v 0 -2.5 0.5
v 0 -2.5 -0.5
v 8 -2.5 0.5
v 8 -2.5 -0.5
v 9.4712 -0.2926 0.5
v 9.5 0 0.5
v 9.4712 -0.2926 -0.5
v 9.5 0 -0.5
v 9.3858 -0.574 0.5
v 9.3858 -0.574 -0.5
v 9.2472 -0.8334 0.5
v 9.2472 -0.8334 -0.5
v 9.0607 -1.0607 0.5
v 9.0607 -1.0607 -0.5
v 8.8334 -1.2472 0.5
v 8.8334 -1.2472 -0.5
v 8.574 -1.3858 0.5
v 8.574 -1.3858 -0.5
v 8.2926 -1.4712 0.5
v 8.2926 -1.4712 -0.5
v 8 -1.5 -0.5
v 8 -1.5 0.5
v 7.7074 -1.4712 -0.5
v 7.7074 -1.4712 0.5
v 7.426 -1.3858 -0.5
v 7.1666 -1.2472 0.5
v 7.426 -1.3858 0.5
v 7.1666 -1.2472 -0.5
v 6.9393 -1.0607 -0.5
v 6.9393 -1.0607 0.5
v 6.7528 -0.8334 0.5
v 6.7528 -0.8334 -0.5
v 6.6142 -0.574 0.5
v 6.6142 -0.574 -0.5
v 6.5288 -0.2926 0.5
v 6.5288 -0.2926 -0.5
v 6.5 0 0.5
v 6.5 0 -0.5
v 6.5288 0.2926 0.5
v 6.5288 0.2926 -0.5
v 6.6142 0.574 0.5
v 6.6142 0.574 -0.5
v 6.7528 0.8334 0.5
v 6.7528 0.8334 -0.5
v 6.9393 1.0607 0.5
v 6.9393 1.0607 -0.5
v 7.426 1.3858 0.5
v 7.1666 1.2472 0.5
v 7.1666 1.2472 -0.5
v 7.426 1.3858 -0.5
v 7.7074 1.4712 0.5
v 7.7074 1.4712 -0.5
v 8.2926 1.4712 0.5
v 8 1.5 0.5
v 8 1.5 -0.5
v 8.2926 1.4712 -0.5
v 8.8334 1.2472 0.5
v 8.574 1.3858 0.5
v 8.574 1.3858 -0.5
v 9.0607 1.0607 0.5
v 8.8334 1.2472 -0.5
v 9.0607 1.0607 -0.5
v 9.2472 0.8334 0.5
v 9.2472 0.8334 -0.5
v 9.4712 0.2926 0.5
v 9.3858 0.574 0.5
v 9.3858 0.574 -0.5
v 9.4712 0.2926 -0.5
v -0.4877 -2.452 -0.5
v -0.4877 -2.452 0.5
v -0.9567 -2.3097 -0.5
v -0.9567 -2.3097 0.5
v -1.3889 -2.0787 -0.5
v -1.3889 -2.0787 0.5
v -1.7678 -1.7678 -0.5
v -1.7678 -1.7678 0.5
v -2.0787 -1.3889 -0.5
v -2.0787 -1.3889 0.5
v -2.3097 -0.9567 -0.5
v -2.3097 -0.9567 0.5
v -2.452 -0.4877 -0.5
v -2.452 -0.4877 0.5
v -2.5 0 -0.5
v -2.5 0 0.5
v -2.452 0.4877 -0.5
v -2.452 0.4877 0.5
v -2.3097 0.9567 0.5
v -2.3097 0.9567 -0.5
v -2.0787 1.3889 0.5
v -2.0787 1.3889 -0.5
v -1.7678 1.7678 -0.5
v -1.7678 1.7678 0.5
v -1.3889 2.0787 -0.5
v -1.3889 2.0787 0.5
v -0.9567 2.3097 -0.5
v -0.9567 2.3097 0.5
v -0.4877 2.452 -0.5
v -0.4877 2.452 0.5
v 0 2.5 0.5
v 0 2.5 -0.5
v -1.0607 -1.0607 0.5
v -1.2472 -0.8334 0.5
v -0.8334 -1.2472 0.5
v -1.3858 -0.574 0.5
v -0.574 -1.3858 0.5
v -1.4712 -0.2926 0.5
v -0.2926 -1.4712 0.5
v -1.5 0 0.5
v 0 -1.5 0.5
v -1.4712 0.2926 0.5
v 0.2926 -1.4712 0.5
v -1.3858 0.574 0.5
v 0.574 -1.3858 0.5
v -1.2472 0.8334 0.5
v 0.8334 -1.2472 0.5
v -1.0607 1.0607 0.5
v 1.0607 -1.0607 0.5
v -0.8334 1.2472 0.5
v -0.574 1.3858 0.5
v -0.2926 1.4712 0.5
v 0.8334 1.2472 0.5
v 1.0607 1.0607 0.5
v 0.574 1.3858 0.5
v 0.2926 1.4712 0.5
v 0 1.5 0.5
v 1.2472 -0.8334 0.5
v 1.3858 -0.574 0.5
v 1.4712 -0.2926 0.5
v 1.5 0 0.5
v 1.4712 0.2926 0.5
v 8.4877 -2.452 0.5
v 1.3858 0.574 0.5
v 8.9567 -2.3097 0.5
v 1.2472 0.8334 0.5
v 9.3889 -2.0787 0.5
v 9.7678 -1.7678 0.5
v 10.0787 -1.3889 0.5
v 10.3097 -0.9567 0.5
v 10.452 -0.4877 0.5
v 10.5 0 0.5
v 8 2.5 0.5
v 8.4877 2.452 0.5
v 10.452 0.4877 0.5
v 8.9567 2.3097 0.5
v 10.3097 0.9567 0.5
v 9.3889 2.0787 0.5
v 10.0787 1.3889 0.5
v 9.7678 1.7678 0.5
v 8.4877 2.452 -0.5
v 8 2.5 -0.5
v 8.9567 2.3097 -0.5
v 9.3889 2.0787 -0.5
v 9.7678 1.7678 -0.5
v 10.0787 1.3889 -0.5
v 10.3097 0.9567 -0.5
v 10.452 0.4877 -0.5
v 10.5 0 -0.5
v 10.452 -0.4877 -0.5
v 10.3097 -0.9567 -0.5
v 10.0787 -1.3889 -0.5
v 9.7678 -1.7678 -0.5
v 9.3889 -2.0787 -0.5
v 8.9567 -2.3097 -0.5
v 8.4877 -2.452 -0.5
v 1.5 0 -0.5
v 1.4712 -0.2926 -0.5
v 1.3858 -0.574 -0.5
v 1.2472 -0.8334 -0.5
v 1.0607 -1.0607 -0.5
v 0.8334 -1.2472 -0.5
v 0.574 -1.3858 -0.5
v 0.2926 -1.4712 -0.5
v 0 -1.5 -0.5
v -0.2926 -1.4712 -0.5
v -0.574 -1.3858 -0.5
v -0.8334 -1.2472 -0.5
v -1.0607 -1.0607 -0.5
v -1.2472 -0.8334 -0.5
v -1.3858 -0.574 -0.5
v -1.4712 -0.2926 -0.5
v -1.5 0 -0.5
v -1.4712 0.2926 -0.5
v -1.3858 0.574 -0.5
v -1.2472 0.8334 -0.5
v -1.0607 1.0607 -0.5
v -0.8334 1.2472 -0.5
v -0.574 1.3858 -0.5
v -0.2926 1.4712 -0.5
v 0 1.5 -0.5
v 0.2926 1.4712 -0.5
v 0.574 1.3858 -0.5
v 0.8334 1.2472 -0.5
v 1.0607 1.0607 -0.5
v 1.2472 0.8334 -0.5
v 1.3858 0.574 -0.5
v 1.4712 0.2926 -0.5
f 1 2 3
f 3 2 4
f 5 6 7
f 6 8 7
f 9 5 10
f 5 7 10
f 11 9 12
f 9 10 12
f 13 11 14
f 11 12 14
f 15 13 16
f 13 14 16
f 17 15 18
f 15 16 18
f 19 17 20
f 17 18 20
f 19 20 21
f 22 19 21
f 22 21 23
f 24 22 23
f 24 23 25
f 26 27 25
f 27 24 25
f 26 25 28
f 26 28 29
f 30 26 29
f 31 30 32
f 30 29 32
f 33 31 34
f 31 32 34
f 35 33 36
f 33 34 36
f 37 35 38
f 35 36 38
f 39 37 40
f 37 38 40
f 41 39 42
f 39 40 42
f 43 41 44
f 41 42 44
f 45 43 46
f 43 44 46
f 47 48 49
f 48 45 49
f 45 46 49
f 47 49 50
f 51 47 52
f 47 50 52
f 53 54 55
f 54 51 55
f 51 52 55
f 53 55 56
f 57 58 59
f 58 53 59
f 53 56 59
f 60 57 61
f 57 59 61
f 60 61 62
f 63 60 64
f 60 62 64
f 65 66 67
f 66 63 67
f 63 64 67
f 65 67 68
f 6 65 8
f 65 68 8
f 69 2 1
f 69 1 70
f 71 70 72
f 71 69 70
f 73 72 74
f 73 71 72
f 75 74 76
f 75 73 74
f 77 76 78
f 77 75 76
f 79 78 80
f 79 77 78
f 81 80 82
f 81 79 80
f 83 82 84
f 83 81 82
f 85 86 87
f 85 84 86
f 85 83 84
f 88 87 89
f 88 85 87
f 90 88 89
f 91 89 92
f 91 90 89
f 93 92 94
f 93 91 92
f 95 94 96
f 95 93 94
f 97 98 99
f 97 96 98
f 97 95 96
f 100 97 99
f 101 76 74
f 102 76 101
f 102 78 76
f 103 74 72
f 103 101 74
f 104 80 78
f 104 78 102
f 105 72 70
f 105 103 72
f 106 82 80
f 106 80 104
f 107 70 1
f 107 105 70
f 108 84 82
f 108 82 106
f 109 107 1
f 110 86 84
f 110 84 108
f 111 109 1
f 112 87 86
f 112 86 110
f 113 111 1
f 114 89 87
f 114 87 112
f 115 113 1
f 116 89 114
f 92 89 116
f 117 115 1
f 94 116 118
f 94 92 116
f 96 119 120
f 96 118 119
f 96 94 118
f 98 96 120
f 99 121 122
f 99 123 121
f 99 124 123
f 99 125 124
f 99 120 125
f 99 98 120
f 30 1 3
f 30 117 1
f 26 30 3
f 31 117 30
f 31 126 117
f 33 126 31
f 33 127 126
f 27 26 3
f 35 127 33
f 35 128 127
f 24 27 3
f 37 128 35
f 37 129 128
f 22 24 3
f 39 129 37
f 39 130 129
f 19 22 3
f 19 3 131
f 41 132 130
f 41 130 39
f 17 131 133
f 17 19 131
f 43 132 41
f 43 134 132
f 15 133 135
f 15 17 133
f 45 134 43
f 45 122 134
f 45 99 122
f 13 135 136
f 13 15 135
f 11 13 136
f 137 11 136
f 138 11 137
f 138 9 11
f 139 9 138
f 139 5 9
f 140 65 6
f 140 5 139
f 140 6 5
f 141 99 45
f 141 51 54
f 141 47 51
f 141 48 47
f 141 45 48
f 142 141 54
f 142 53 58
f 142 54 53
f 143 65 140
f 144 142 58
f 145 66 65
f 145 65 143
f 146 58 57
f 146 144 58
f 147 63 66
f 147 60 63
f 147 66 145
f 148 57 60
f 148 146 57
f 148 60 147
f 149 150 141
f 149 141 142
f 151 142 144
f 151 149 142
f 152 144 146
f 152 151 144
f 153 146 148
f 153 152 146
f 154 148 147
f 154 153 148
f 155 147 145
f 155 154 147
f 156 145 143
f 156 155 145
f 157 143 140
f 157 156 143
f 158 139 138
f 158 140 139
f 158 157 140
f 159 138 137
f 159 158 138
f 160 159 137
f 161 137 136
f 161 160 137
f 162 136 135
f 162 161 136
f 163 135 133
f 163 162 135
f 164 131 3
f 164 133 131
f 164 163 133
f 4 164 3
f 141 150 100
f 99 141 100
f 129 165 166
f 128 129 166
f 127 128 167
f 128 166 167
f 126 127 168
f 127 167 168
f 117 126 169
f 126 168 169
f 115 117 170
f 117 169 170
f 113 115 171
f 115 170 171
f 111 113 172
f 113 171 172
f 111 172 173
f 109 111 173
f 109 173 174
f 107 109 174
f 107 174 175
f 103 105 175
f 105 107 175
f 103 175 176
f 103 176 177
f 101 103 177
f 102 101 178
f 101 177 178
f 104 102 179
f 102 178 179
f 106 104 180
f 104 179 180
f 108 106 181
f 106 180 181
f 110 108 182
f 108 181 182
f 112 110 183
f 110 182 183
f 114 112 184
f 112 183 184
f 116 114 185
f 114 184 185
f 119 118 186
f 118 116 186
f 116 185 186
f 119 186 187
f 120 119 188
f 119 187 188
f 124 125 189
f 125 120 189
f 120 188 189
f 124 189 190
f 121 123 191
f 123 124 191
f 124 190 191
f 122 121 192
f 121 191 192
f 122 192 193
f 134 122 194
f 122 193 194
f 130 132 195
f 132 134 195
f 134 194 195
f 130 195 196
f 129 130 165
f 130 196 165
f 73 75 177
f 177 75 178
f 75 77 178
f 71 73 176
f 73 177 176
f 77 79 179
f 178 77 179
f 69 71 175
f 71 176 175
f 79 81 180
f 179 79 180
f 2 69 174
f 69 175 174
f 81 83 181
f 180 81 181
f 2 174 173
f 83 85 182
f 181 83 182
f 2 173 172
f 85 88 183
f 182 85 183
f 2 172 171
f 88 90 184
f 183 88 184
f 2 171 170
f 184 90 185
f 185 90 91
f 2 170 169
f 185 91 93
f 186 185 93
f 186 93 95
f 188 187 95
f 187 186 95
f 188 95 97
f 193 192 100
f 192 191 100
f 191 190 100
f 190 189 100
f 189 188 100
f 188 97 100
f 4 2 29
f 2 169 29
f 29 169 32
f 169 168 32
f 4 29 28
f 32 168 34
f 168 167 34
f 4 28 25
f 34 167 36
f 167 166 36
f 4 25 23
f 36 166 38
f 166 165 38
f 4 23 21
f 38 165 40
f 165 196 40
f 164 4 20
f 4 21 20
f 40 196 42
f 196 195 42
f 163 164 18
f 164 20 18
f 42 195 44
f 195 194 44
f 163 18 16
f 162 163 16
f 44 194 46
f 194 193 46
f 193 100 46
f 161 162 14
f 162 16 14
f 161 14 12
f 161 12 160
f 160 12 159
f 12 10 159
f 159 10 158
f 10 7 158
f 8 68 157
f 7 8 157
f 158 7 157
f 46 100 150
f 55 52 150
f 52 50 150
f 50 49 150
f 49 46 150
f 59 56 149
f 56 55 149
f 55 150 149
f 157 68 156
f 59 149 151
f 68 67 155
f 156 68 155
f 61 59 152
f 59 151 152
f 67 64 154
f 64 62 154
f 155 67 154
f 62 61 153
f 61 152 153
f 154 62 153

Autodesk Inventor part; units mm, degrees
ref_plane "YZ Plane" through (0, 0, 0) normal (1, 0, 0) x (0, 1, 0)
ref_plane "XZ Plane" through (0, 0, 0) normal (0, 1, 0) x (-1, 0, 0)
ref_plane "XY Plane" through (0, 0, 0) normal (0, 0, 1) x (1, 0, 0)
sketch "Sketch1" plane through (0, 0, 0) normal (0, 0, 1) x (1, 0, 0)
  line L0 (0, 0) -> (8, 0) construction
  line L1 (0, -2.5) -> (8, -2.5)
  line L2 (8, 2.5) -> (0, 2.5)
  arc A0 (0, 2.5) -> (0, -2.5) centre (0, 0) ccw
  arc A1 (8, -2.5) -> (8, 2.5) centre (8, 0) ccw
  circle A2 centre (8, 0) radius 1.5
  circle A3 centre (0, 0) radius 1.5
  point P0 (4, 0)
  dimension "d0" = 8
  dimension "d1" = 5
  dimension "d2" = 3
  dimension "d3" = 3
extrude "Extrusion1" add sketch "Sketch1" along normal mid plane 1
properties part number "CompressionRollerActuatorLinkage1" material "Stainless Steel"
